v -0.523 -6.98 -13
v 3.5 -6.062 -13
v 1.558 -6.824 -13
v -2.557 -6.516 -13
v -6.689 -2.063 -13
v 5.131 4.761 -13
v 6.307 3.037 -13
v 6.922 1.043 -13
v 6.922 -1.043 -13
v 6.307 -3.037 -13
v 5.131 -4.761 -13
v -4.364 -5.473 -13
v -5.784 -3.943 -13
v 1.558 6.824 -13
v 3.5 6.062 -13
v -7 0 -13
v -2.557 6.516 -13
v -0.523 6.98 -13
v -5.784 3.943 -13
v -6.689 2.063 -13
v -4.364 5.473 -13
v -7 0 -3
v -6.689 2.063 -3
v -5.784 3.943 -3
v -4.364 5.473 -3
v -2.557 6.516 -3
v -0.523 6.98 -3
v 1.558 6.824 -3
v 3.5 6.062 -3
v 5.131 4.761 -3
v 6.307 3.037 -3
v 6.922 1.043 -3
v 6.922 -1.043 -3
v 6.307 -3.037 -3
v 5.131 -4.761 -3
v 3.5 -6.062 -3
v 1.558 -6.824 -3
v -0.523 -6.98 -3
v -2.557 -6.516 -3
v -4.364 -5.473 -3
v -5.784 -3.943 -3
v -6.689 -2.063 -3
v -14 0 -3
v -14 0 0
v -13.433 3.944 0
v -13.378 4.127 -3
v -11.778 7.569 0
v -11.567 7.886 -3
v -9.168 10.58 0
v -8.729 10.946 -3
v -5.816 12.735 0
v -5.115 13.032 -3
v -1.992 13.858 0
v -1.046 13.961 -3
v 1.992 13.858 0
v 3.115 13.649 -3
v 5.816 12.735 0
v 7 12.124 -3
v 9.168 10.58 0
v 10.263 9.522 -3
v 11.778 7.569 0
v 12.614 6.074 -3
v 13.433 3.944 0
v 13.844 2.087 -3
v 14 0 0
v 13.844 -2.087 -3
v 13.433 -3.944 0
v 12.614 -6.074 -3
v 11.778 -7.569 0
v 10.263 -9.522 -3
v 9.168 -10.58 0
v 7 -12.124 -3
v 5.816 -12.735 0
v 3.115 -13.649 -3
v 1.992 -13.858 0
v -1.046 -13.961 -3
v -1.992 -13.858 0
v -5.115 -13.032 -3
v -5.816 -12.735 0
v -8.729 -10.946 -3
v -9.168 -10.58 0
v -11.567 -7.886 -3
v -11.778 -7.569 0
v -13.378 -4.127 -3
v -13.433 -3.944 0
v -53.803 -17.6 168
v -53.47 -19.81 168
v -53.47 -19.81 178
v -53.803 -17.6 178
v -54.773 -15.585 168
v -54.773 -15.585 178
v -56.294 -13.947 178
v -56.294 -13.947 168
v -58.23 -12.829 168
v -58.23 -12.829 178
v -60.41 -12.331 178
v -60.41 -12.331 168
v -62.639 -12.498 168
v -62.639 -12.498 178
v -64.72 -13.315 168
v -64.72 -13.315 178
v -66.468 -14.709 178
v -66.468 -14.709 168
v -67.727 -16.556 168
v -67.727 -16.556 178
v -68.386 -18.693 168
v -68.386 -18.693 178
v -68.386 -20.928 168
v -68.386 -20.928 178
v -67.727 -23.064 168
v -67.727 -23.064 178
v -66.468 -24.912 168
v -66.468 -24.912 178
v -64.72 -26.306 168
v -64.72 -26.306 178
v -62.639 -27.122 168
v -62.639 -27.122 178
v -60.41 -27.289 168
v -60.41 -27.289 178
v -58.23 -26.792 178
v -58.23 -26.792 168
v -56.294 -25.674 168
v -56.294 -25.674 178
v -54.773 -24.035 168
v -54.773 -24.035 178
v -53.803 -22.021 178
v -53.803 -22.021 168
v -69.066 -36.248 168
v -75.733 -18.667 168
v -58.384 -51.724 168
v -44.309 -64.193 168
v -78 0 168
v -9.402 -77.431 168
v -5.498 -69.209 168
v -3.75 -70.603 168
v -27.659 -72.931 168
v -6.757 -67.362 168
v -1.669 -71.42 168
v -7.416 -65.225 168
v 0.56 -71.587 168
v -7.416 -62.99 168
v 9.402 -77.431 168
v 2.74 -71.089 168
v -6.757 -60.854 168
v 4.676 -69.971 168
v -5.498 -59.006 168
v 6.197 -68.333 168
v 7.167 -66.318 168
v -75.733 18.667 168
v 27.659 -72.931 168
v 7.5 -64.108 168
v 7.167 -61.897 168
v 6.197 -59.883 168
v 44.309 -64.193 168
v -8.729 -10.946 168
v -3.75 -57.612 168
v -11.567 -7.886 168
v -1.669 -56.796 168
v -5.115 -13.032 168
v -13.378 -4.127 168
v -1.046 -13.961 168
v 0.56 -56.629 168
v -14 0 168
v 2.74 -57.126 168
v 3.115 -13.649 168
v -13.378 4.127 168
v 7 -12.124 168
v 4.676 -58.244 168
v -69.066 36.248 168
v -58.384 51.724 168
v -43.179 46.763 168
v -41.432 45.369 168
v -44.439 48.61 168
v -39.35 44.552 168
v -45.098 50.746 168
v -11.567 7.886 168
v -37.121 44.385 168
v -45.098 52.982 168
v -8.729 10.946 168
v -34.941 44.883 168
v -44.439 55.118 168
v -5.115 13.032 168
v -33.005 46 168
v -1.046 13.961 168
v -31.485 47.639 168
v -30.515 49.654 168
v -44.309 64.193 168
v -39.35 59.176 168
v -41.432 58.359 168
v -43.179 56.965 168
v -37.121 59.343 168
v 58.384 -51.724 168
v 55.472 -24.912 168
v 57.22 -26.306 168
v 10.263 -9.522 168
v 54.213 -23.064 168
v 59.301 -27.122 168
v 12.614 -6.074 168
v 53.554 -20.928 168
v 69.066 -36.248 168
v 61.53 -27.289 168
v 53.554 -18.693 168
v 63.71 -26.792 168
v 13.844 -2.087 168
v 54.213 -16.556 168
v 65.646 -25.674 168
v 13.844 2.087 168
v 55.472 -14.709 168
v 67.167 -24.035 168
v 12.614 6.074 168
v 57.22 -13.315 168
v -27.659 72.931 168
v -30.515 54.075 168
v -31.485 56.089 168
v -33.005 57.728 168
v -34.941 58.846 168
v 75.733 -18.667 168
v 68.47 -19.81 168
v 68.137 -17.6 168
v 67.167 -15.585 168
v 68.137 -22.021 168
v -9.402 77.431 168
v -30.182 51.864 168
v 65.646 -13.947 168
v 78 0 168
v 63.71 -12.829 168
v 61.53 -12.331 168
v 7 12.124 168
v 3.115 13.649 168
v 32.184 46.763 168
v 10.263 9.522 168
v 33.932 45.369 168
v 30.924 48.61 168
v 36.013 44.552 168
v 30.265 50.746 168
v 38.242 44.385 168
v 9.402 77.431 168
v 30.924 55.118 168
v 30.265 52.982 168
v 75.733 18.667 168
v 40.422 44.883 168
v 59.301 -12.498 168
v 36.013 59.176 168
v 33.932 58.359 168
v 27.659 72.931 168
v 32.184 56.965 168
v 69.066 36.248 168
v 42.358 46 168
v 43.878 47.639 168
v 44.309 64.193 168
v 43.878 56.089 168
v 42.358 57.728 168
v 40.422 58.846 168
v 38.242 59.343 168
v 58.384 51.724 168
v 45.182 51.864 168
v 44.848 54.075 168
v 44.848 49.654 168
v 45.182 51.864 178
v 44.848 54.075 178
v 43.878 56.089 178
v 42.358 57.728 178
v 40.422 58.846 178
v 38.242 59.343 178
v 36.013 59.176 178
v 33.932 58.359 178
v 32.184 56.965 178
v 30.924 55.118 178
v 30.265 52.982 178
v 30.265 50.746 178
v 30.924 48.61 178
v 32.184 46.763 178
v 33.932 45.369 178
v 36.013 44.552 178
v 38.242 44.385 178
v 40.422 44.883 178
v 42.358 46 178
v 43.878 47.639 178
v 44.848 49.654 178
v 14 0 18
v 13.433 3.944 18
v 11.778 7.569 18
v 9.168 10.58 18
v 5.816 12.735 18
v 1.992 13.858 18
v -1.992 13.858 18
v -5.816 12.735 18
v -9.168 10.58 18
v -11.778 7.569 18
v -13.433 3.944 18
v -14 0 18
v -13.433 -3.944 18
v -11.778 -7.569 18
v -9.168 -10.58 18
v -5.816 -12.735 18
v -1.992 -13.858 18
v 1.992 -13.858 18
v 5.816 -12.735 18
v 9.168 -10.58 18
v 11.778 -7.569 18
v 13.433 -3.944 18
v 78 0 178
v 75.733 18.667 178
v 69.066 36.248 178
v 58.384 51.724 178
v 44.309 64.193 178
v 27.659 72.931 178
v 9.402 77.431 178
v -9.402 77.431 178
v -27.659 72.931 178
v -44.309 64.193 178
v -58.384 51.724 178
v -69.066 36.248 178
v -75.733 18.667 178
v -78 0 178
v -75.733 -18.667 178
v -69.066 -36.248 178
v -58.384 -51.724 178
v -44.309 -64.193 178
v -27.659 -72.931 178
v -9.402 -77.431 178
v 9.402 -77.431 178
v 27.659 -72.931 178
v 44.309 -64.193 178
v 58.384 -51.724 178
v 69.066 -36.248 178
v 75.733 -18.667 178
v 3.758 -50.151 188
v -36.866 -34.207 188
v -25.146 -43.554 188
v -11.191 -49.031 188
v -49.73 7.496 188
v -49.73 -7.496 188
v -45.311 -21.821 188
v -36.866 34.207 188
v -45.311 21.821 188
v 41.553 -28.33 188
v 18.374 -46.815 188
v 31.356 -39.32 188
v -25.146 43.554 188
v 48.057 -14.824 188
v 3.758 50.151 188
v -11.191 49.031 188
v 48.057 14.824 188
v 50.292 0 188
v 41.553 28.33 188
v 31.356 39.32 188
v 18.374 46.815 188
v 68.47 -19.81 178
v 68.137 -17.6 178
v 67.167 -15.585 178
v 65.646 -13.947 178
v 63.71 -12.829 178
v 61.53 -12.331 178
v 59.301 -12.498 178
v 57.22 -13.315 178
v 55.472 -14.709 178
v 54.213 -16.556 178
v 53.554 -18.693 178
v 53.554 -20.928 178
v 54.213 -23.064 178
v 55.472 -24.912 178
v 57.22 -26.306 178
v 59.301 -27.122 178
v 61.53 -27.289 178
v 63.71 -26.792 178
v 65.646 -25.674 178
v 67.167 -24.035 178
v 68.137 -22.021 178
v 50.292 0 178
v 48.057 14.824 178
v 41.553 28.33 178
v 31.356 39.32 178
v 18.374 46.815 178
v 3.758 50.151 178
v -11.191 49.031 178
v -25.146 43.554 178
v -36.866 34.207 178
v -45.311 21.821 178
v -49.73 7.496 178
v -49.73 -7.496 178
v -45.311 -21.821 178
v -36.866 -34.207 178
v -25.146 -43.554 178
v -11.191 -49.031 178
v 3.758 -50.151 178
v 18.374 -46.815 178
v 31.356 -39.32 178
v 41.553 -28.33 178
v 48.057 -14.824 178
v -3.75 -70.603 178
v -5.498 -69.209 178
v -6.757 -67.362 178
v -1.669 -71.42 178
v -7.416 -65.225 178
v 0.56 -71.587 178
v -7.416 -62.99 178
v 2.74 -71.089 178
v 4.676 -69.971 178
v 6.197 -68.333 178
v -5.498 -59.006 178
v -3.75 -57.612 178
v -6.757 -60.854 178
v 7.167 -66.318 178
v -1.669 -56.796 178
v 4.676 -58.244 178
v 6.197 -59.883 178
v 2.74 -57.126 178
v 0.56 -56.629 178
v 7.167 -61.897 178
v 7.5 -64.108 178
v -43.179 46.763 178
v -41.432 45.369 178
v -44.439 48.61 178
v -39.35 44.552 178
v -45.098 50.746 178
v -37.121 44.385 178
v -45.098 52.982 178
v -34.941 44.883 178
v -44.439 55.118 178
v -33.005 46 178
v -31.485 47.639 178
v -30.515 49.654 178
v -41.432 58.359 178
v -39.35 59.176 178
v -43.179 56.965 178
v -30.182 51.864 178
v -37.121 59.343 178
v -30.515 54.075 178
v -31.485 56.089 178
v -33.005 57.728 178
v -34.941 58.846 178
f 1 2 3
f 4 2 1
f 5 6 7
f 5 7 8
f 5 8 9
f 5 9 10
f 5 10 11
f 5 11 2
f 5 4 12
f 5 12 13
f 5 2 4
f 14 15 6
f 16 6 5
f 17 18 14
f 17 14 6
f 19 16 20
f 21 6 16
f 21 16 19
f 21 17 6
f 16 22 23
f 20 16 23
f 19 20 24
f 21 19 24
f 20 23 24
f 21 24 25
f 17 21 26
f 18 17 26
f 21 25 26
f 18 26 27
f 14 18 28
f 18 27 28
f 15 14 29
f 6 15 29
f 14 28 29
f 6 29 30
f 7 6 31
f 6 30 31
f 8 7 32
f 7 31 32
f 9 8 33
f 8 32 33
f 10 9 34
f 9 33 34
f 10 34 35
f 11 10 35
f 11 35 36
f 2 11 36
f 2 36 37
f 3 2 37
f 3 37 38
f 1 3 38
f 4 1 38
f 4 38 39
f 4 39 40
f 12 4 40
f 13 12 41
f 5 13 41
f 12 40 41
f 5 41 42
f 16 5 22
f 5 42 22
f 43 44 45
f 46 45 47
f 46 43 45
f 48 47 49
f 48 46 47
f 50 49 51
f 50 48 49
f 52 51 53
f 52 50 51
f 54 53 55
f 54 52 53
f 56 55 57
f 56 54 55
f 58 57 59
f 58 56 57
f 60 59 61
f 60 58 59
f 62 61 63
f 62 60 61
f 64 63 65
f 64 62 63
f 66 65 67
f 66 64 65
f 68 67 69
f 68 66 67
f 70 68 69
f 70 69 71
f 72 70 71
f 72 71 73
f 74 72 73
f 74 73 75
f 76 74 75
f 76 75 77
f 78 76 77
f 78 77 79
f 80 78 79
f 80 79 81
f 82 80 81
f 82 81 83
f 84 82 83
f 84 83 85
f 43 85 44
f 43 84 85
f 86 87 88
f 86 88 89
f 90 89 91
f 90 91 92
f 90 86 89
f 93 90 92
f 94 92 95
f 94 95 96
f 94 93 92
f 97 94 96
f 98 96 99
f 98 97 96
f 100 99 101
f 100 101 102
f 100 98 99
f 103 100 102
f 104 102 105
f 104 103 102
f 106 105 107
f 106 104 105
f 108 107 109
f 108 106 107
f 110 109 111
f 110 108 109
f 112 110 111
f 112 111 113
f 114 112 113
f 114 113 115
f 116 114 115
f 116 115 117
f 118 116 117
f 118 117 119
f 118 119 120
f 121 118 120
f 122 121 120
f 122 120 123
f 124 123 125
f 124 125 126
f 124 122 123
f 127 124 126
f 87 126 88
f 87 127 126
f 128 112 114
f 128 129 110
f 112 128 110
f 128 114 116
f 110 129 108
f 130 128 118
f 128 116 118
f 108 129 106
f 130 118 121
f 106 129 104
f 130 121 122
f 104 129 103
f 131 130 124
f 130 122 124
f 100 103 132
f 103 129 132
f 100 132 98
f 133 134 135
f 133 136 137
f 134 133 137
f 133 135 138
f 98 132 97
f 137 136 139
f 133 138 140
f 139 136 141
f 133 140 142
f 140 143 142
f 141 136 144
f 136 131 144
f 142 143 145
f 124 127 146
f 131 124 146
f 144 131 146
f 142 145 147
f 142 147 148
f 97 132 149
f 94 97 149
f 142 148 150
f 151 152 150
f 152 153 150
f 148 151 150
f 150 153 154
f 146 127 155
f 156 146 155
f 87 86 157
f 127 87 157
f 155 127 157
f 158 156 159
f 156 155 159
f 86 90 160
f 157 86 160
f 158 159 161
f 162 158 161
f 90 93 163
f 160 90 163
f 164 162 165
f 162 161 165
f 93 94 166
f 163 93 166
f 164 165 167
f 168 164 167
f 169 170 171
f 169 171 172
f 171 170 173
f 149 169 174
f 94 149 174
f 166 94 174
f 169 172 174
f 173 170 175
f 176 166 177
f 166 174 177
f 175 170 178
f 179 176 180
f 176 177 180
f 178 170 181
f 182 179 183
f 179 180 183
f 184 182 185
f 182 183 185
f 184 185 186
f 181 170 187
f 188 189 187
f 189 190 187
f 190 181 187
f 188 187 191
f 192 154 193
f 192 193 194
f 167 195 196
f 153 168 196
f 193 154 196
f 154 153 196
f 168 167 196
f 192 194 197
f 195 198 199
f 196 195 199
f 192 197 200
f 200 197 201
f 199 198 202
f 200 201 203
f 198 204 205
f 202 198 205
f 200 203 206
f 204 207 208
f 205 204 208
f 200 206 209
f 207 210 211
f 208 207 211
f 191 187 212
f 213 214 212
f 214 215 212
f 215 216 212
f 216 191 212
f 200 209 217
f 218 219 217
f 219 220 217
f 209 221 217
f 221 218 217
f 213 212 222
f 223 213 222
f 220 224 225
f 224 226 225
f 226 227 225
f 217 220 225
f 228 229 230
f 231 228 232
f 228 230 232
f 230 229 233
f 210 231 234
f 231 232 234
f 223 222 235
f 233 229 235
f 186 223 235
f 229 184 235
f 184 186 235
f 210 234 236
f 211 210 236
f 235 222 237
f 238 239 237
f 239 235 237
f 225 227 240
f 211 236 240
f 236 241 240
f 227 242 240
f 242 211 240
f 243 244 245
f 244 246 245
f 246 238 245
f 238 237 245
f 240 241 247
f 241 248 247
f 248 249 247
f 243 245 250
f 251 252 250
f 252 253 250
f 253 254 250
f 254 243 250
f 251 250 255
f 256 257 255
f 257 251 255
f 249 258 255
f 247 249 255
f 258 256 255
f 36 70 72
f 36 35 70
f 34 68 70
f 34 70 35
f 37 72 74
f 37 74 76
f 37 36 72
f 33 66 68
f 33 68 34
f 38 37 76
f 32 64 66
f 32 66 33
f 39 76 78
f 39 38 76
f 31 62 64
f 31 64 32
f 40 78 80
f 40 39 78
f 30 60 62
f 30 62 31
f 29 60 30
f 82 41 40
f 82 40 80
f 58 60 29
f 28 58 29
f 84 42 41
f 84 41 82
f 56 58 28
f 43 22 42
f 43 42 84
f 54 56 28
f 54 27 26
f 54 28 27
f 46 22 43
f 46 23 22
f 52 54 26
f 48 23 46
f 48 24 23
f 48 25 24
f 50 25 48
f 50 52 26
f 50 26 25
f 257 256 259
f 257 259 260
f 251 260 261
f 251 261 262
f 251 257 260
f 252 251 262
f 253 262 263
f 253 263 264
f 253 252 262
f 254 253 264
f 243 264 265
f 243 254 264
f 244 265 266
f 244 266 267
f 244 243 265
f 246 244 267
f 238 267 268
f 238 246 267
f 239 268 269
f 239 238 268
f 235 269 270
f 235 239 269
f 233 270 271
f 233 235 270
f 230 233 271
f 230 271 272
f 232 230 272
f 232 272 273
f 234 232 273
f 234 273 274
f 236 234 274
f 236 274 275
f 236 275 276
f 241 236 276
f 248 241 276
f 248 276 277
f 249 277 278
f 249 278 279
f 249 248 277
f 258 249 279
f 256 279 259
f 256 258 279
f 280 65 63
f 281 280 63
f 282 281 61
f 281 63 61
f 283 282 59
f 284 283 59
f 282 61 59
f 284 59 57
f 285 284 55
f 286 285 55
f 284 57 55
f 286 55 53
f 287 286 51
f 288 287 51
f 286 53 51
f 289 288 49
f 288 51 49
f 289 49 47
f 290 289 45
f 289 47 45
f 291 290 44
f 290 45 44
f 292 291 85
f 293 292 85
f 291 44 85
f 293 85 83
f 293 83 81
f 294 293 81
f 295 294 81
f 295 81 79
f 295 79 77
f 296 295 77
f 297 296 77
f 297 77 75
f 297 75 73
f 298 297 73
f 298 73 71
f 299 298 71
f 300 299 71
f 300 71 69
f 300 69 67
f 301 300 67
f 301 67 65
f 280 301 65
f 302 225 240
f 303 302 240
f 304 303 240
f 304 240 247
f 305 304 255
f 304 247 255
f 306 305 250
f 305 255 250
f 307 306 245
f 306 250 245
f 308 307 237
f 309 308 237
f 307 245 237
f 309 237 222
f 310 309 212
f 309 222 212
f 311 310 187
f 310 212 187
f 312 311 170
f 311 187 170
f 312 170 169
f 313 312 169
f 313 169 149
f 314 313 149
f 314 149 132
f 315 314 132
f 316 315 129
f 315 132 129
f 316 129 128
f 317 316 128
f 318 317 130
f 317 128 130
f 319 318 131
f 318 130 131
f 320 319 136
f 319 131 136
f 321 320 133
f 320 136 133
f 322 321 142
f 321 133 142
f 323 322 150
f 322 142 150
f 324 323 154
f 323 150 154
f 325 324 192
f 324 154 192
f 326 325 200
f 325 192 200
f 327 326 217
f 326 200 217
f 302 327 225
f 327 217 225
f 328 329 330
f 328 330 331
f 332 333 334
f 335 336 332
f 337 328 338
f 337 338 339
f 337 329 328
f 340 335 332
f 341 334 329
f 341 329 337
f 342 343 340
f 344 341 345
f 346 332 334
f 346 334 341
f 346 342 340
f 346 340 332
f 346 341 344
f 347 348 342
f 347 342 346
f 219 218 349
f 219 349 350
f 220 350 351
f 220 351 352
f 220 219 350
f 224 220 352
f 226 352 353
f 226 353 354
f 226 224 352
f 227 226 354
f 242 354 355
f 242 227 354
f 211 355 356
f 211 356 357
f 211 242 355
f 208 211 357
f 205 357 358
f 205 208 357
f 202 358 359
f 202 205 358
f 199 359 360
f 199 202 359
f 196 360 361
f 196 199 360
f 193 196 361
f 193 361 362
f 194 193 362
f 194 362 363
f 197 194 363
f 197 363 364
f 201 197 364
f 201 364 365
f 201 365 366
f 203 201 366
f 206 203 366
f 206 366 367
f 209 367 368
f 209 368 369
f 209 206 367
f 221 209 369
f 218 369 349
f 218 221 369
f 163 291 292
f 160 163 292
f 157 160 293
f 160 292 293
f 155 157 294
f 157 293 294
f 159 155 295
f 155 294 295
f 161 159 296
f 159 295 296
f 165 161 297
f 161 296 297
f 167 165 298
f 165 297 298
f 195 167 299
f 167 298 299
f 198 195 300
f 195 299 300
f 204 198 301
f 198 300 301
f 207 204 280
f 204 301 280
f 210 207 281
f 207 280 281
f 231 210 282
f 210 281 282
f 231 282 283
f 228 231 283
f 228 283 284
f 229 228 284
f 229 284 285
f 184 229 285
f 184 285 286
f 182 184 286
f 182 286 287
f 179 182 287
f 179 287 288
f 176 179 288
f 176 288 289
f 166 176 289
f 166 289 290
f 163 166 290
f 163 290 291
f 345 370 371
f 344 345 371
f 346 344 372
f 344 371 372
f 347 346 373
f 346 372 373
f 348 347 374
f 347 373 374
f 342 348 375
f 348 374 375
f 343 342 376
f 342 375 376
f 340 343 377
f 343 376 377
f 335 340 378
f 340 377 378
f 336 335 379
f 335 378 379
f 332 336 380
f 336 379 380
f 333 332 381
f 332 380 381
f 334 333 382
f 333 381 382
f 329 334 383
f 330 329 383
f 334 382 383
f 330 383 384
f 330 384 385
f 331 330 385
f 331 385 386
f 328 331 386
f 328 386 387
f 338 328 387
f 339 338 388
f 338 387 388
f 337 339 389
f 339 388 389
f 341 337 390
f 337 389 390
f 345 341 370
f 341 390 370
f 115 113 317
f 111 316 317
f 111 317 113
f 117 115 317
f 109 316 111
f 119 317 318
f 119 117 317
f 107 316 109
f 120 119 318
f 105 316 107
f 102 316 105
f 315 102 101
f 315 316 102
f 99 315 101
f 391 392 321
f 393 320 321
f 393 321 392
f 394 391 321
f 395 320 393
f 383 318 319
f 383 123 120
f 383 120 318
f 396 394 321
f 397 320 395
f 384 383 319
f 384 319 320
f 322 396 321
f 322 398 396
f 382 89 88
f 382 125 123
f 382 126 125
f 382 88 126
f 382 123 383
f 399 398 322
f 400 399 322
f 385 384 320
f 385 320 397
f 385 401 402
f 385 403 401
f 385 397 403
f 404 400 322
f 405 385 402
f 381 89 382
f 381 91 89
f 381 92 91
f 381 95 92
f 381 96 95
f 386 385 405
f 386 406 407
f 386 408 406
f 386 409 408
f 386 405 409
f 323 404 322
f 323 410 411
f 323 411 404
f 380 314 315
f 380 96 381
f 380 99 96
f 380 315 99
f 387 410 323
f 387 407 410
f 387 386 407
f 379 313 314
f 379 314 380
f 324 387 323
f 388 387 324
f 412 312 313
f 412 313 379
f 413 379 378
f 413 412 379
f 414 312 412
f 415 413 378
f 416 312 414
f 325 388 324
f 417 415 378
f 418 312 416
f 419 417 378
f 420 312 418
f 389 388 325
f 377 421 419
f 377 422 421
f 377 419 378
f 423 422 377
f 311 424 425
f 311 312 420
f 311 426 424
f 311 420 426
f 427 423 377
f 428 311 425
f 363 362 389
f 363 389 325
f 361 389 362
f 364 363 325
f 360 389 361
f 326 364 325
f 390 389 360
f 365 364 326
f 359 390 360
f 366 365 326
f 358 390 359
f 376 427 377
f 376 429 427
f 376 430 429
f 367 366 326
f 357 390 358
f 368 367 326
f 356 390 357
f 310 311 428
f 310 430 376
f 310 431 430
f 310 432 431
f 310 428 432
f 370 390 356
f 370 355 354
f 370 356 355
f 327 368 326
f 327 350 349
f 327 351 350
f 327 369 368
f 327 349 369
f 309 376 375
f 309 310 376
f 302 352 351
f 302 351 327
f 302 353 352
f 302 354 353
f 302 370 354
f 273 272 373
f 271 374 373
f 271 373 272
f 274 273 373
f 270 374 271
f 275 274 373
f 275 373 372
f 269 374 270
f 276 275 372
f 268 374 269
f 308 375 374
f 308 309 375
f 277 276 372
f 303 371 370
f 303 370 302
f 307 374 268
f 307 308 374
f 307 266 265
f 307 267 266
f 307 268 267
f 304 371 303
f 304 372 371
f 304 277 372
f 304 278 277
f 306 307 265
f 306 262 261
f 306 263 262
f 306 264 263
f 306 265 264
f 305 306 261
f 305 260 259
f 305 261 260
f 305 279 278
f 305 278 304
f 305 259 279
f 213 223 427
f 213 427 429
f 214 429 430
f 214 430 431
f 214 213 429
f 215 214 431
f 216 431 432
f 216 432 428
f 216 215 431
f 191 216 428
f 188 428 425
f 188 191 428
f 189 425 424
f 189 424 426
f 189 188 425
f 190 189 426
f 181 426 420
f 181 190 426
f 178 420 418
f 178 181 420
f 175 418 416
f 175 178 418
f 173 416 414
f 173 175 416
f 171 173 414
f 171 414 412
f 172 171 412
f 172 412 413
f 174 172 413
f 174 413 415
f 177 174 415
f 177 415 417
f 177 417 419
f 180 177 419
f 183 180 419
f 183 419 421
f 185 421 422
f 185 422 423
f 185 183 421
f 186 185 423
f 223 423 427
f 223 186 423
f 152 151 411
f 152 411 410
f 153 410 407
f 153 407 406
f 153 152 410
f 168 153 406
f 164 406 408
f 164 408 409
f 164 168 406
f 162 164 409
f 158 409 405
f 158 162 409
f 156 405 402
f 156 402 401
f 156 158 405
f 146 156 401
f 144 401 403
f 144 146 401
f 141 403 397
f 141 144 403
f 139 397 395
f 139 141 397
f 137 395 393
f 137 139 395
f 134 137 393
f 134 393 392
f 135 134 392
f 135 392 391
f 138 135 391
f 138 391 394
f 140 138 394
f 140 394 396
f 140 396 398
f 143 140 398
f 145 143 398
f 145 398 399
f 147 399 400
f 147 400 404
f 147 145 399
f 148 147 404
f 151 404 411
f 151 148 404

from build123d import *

# Parameters (mm, degrees)
SKETCH1_R            = 14
BOSS_EXTRUDE2_DEPTH  = 18
BOSS_EXTRUDE7_START  = 3
SKETCH8_R            = 14
BOSS_EXTRUDE7_DEPTH  = 3
SKETCH12_R           = 14
BOSS_EXTRUDE11_DEPTH = 150
SKETCH13_R           = 7
BOSS_EXTRUDE12_DEPTH = 10
SKETCH14_R           = 78
SKETCH14_R_2         = 7.5
BOSS_EXTRUDE13_DEPTH = 10
SKETCH15_R           = 50.291796038
BOSS_EXTRUDE14_DEPTH = 10


with BuildPart() as part:
    # Sketch1 → Boss-Extrude2 (new body)
    with BuildSketch(Plane.XY):
        Circle(SKETCH1_R)
    extrude(amount=BOSS_EXTRUDE2_DEPTH)

    # Sketch8 → Boss-Extrude7 (add)
    with BuildSketch(Plane(origin=(0, 0, 0), x_dir=(-1, 0, 0), z_dir=(0, 0, -1)).offset(BOSS_EXTRUDE7_START)):
        Circle(SKETCH8_R)
    extrude(amount=-BOSS_EXTRUDE7_DEPTH)

    # Sketch12 → Boss-Extrude11 (add)
    with BuildSketch(Plane.XY.offset(18)):
        with Locations(Location((0, 0, 0), (0, 0, 180))):
            Circle(SKETCH12_R)
    extrude(amount=BOSS_EXTRUDE11_DEPTH)

    # Sketch13 → Boss-Extrude12 (add)
    with BuildSketch(Plane(origin=(0, 0, -3), x_dir=(-1, 0, 0), z_dir=(0, 0, -1))):
        Circle(SKETCH13_R)
    extrude(amount=BOSS_EXTRUDE12_DEPTH)

    # Sketch14 → Boss-Extrude13 (add)
    with BuildSketch(Plane.XY.offset(168)):
        Circle(SKETCH14_R)
        with Locations((0, -64.10766693)):
            Circle(SKETCH14_R_2, mode=Mode.SUBTRACT)
        with Locations((-60.970014378, -19.810358551)):
            Circle(SKETCH14_R_2, mode=Mode.SUBTRACT)
        with Locations((-37.68154118, 51.864192016)):
            Circle(SKETCH14_R_2, mode=Mode.SUBTRACT)
        with Locations((37.68154118, 51.864192016)):
            Circle(SKETCH14_R_2, mode=Mode.SUBTRACT)
        with Locations((60.970014378, -19.810358551)):
            Circle(SKETCH14_R_2, mode=Mode.SUBTRACT)
    extrude(amount=BOSS_EXTRUDE13_DEPTH)

    # Sketch15 → Boss-Extrude14 (add)
    with BuildSketch(Plane.XY.offset(178)):
        Circle(SKETCH15_R)
    extrude(amount=BOSS_EXTRUDE14_DEPTH)


solid = part.part
